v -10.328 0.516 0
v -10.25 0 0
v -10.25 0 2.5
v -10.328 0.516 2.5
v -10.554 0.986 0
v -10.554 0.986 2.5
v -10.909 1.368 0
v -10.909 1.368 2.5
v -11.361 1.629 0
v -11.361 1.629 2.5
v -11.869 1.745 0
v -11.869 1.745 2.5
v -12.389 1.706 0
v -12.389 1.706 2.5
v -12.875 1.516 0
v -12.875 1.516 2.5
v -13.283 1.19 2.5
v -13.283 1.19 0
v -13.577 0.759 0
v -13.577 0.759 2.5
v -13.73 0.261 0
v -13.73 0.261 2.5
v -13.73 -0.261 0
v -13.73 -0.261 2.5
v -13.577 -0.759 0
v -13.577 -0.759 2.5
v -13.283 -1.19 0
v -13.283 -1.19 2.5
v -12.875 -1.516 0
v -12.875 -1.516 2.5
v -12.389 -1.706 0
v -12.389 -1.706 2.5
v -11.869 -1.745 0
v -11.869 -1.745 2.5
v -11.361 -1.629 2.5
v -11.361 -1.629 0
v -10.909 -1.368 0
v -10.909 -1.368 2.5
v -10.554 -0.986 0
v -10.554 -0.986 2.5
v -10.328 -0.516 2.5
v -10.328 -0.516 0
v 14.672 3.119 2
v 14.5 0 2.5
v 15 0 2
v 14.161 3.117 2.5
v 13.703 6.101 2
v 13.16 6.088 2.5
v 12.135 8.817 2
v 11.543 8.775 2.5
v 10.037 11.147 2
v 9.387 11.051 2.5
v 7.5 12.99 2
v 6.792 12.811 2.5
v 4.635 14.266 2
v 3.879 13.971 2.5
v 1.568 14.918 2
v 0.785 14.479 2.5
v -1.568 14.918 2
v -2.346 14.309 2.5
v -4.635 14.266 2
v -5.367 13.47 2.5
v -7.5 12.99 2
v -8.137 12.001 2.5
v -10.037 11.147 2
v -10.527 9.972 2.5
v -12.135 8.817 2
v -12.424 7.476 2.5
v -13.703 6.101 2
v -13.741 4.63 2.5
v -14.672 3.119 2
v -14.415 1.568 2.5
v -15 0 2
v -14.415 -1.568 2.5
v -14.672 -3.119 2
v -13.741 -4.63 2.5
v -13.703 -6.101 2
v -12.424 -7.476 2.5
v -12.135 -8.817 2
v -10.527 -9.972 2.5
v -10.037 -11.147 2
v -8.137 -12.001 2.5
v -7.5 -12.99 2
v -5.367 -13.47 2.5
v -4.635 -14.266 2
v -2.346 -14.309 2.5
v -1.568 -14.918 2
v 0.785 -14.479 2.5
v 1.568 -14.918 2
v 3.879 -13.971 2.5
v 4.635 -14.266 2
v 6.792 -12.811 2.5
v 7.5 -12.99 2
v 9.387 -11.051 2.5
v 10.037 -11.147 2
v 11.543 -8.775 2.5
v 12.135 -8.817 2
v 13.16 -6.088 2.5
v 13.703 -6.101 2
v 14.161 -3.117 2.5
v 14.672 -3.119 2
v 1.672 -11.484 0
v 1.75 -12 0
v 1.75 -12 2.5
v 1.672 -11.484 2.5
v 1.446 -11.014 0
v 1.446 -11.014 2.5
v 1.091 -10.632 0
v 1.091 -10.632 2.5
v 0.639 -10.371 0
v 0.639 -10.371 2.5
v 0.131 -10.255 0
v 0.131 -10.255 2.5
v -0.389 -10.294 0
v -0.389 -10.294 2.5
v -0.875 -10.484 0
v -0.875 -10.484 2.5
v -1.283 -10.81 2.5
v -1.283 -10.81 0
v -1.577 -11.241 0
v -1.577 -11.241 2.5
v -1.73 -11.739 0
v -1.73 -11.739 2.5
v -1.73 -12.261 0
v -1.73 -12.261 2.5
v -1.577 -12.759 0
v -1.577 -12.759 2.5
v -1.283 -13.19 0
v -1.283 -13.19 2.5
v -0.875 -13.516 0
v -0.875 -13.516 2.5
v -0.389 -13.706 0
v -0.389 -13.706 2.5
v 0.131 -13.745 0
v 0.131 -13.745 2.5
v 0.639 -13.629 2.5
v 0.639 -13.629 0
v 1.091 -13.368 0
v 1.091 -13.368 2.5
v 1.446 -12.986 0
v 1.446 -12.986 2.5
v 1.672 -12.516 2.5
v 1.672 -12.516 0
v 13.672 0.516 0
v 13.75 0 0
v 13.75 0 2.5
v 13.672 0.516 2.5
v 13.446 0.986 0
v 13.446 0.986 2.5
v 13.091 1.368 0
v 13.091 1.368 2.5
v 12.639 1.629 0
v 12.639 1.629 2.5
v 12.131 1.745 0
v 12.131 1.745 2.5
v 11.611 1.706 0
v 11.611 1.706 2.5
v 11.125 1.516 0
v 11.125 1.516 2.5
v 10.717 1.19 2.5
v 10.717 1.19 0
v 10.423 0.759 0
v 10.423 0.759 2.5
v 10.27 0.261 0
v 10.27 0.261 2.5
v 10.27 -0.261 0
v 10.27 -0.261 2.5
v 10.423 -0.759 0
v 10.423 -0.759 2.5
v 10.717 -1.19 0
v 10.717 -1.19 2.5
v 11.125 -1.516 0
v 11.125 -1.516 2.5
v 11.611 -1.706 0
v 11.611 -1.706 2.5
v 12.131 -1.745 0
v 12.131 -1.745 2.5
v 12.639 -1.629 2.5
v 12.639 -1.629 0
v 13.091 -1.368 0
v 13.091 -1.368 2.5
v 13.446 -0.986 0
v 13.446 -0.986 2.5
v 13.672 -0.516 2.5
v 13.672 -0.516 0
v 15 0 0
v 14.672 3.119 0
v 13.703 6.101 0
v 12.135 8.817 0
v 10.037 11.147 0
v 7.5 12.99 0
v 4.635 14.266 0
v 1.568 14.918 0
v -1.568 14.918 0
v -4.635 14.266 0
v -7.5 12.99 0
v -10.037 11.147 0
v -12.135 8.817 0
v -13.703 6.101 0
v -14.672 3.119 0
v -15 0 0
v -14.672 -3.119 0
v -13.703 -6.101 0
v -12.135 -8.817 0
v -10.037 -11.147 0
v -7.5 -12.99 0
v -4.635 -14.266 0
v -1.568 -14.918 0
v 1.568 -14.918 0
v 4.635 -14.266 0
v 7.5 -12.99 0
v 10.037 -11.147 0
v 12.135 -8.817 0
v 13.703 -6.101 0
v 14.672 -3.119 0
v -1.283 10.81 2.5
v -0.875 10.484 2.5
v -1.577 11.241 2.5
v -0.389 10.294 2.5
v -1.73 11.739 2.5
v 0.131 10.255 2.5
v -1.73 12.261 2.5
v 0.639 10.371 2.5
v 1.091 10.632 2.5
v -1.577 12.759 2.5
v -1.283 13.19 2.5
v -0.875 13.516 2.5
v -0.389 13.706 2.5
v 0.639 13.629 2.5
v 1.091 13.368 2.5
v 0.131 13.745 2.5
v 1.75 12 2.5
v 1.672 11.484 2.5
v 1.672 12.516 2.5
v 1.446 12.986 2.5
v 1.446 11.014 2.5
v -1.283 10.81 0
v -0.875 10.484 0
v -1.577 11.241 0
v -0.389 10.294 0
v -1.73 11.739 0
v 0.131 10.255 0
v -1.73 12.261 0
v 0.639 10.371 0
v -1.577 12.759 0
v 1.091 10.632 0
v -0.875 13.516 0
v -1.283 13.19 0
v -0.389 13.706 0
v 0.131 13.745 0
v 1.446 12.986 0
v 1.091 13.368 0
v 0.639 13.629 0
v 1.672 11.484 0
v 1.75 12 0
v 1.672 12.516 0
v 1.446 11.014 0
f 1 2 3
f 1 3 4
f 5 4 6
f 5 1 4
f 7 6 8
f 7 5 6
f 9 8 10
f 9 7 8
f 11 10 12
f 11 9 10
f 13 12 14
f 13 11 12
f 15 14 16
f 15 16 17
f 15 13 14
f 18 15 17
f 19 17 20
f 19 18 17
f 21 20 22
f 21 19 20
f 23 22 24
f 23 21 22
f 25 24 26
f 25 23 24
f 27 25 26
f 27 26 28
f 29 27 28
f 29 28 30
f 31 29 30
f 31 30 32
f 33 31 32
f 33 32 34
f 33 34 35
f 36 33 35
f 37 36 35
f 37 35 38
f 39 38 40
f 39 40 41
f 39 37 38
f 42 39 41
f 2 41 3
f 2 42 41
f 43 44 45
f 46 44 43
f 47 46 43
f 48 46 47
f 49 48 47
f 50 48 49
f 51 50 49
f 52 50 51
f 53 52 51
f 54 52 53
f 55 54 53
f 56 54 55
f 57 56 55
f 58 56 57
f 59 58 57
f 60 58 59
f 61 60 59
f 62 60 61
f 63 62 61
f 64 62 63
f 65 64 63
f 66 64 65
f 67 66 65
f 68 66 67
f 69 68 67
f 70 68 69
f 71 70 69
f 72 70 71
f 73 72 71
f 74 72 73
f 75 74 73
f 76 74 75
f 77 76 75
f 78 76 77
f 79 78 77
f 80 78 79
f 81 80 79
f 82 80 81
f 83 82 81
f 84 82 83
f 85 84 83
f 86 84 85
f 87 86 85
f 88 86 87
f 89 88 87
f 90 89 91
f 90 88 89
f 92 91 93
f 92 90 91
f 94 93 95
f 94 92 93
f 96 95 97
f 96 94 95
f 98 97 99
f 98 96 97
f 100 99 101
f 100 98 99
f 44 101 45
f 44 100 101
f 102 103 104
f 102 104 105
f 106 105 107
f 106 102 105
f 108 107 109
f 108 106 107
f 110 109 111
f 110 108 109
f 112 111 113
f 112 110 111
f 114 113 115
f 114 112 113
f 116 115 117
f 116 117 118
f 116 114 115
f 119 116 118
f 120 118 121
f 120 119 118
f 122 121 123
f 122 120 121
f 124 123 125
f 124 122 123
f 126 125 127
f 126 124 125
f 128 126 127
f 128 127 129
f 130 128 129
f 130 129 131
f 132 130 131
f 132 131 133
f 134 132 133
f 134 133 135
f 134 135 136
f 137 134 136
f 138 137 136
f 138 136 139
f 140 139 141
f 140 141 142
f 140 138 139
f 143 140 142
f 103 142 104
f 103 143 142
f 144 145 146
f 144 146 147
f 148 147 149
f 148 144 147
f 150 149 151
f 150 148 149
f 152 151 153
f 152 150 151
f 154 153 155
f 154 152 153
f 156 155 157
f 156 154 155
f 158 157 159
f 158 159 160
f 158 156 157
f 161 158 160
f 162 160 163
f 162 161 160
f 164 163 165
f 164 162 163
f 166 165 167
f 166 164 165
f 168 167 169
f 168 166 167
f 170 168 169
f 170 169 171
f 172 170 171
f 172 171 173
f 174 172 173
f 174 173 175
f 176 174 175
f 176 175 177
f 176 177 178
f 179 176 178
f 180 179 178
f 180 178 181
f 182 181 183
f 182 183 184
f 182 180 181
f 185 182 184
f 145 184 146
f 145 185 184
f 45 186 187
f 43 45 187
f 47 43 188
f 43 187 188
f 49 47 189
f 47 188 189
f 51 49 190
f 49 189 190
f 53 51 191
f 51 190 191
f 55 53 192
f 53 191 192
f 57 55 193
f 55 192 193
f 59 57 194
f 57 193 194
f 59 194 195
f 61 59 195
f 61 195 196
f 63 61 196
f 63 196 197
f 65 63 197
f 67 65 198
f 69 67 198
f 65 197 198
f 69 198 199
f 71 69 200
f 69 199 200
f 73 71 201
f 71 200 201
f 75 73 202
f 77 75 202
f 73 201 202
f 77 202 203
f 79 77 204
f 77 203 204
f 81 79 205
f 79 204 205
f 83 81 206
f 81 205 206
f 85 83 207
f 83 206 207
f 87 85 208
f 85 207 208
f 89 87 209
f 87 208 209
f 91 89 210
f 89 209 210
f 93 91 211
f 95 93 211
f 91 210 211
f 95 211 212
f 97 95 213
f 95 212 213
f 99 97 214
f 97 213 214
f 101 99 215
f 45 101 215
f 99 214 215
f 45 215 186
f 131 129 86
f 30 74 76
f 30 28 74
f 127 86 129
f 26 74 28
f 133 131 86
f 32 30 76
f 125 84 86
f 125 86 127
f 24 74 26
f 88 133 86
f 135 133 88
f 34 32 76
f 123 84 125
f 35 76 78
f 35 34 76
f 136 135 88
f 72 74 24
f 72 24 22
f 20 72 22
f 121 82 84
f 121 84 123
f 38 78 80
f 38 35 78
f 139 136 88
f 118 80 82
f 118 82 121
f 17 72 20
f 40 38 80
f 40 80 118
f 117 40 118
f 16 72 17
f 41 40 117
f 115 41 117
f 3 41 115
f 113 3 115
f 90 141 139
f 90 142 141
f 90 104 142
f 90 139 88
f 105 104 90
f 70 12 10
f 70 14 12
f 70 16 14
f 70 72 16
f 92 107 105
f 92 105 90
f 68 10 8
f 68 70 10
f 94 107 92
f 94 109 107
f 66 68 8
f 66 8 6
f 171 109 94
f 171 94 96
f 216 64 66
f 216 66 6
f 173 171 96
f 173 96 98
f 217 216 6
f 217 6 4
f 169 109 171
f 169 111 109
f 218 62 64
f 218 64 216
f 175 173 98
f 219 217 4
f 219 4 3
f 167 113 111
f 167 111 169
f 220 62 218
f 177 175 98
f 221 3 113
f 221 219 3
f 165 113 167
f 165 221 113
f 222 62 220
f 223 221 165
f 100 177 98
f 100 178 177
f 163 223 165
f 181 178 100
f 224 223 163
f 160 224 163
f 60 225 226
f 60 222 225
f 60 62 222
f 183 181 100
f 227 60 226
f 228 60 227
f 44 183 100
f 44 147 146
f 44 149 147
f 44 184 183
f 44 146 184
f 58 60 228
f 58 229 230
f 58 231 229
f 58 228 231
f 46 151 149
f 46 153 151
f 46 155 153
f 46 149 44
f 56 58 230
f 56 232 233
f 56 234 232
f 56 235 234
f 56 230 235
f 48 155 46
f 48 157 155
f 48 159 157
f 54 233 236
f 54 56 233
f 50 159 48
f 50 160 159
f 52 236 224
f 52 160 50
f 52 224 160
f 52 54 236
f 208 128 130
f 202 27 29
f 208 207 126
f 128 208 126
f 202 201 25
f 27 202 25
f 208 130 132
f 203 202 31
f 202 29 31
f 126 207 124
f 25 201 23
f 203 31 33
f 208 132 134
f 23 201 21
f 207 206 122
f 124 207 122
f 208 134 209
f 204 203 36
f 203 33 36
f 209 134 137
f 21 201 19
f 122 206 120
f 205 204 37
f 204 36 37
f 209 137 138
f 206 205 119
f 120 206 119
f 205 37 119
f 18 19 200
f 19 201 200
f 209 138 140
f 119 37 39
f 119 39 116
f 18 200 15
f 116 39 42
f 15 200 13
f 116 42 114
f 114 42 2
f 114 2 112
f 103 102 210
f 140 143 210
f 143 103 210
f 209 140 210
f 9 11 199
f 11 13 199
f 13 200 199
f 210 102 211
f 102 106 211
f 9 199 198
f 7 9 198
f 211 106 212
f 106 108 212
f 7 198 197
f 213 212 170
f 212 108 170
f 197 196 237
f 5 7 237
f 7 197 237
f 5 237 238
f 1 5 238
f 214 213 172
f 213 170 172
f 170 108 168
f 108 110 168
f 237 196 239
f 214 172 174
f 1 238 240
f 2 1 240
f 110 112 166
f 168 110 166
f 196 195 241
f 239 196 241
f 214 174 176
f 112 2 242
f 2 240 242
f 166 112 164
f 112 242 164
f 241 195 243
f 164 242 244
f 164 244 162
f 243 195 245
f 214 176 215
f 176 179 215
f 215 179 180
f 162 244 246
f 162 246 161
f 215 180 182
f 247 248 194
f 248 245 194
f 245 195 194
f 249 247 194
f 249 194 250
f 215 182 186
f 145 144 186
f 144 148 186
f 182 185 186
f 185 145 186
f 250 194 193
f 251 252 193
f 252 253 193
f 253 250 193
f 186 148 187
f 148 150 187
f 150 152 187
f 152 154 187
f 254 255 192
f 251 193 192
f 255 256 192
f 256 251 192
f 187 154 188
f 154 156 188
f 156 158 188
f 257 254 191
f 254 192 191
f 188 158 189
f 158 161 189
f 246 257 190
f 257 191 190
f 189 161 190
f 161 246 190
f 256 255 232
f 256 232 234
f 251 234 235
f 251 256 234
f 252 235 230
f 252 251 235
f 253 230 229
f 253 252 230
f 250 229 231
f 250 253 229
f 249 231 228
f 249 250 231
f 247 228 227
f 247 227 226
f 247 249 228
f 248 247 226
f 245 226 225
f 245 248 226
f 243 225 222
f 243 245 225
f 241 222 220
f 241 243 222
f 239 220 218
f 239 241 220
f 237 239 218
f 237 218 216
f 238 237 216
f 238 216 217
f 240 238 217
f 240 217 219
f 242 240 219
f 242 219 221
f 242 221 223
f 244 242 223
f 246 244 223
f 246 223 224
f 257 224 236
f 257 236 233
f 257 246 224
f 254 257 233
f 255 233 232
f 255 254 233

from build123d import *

# Parameters (mm, degrees)
F0_R     = 15
F0_R_2   = 1.75
F0_R_3   = 6.5
F1_DEPTH = 2.5
F2_SIZE  = 0.5


with BuildPart() as f1:
    # F0 (on Top) → F1 (new body)
    with BuildSketch(Plane.XY):
        Circle(F0_R)
        with Locations((0, -12)):
            Circle(F0_R_2, mode=Mode.SUBTRACT)
        with Locations((-12, 0)):
            Circle(F0_R_2, mode=Mode.SUBTRACT)
        Circle(F0_R_3, mode=Mode.SUBTRACT)
        with Locations((12, 0)):
            Circle(F0_R_2, mode=Mode.SUBTRACT)
        with Locations((0, 12)):
            Circle(F0_R_2, mode=Mode.SUBTRACT)
        Circle(F0_R_3)
    extrude(amount=F1_DEPTH)

    # F2
    f2_edges = [f1.edges().sort_by_distance(p)[0] for p in [
        (-15, 0, 2.5),
    ]]
    chamfer(f2_edges, length=F2_SIZE)


solid = f1.part
